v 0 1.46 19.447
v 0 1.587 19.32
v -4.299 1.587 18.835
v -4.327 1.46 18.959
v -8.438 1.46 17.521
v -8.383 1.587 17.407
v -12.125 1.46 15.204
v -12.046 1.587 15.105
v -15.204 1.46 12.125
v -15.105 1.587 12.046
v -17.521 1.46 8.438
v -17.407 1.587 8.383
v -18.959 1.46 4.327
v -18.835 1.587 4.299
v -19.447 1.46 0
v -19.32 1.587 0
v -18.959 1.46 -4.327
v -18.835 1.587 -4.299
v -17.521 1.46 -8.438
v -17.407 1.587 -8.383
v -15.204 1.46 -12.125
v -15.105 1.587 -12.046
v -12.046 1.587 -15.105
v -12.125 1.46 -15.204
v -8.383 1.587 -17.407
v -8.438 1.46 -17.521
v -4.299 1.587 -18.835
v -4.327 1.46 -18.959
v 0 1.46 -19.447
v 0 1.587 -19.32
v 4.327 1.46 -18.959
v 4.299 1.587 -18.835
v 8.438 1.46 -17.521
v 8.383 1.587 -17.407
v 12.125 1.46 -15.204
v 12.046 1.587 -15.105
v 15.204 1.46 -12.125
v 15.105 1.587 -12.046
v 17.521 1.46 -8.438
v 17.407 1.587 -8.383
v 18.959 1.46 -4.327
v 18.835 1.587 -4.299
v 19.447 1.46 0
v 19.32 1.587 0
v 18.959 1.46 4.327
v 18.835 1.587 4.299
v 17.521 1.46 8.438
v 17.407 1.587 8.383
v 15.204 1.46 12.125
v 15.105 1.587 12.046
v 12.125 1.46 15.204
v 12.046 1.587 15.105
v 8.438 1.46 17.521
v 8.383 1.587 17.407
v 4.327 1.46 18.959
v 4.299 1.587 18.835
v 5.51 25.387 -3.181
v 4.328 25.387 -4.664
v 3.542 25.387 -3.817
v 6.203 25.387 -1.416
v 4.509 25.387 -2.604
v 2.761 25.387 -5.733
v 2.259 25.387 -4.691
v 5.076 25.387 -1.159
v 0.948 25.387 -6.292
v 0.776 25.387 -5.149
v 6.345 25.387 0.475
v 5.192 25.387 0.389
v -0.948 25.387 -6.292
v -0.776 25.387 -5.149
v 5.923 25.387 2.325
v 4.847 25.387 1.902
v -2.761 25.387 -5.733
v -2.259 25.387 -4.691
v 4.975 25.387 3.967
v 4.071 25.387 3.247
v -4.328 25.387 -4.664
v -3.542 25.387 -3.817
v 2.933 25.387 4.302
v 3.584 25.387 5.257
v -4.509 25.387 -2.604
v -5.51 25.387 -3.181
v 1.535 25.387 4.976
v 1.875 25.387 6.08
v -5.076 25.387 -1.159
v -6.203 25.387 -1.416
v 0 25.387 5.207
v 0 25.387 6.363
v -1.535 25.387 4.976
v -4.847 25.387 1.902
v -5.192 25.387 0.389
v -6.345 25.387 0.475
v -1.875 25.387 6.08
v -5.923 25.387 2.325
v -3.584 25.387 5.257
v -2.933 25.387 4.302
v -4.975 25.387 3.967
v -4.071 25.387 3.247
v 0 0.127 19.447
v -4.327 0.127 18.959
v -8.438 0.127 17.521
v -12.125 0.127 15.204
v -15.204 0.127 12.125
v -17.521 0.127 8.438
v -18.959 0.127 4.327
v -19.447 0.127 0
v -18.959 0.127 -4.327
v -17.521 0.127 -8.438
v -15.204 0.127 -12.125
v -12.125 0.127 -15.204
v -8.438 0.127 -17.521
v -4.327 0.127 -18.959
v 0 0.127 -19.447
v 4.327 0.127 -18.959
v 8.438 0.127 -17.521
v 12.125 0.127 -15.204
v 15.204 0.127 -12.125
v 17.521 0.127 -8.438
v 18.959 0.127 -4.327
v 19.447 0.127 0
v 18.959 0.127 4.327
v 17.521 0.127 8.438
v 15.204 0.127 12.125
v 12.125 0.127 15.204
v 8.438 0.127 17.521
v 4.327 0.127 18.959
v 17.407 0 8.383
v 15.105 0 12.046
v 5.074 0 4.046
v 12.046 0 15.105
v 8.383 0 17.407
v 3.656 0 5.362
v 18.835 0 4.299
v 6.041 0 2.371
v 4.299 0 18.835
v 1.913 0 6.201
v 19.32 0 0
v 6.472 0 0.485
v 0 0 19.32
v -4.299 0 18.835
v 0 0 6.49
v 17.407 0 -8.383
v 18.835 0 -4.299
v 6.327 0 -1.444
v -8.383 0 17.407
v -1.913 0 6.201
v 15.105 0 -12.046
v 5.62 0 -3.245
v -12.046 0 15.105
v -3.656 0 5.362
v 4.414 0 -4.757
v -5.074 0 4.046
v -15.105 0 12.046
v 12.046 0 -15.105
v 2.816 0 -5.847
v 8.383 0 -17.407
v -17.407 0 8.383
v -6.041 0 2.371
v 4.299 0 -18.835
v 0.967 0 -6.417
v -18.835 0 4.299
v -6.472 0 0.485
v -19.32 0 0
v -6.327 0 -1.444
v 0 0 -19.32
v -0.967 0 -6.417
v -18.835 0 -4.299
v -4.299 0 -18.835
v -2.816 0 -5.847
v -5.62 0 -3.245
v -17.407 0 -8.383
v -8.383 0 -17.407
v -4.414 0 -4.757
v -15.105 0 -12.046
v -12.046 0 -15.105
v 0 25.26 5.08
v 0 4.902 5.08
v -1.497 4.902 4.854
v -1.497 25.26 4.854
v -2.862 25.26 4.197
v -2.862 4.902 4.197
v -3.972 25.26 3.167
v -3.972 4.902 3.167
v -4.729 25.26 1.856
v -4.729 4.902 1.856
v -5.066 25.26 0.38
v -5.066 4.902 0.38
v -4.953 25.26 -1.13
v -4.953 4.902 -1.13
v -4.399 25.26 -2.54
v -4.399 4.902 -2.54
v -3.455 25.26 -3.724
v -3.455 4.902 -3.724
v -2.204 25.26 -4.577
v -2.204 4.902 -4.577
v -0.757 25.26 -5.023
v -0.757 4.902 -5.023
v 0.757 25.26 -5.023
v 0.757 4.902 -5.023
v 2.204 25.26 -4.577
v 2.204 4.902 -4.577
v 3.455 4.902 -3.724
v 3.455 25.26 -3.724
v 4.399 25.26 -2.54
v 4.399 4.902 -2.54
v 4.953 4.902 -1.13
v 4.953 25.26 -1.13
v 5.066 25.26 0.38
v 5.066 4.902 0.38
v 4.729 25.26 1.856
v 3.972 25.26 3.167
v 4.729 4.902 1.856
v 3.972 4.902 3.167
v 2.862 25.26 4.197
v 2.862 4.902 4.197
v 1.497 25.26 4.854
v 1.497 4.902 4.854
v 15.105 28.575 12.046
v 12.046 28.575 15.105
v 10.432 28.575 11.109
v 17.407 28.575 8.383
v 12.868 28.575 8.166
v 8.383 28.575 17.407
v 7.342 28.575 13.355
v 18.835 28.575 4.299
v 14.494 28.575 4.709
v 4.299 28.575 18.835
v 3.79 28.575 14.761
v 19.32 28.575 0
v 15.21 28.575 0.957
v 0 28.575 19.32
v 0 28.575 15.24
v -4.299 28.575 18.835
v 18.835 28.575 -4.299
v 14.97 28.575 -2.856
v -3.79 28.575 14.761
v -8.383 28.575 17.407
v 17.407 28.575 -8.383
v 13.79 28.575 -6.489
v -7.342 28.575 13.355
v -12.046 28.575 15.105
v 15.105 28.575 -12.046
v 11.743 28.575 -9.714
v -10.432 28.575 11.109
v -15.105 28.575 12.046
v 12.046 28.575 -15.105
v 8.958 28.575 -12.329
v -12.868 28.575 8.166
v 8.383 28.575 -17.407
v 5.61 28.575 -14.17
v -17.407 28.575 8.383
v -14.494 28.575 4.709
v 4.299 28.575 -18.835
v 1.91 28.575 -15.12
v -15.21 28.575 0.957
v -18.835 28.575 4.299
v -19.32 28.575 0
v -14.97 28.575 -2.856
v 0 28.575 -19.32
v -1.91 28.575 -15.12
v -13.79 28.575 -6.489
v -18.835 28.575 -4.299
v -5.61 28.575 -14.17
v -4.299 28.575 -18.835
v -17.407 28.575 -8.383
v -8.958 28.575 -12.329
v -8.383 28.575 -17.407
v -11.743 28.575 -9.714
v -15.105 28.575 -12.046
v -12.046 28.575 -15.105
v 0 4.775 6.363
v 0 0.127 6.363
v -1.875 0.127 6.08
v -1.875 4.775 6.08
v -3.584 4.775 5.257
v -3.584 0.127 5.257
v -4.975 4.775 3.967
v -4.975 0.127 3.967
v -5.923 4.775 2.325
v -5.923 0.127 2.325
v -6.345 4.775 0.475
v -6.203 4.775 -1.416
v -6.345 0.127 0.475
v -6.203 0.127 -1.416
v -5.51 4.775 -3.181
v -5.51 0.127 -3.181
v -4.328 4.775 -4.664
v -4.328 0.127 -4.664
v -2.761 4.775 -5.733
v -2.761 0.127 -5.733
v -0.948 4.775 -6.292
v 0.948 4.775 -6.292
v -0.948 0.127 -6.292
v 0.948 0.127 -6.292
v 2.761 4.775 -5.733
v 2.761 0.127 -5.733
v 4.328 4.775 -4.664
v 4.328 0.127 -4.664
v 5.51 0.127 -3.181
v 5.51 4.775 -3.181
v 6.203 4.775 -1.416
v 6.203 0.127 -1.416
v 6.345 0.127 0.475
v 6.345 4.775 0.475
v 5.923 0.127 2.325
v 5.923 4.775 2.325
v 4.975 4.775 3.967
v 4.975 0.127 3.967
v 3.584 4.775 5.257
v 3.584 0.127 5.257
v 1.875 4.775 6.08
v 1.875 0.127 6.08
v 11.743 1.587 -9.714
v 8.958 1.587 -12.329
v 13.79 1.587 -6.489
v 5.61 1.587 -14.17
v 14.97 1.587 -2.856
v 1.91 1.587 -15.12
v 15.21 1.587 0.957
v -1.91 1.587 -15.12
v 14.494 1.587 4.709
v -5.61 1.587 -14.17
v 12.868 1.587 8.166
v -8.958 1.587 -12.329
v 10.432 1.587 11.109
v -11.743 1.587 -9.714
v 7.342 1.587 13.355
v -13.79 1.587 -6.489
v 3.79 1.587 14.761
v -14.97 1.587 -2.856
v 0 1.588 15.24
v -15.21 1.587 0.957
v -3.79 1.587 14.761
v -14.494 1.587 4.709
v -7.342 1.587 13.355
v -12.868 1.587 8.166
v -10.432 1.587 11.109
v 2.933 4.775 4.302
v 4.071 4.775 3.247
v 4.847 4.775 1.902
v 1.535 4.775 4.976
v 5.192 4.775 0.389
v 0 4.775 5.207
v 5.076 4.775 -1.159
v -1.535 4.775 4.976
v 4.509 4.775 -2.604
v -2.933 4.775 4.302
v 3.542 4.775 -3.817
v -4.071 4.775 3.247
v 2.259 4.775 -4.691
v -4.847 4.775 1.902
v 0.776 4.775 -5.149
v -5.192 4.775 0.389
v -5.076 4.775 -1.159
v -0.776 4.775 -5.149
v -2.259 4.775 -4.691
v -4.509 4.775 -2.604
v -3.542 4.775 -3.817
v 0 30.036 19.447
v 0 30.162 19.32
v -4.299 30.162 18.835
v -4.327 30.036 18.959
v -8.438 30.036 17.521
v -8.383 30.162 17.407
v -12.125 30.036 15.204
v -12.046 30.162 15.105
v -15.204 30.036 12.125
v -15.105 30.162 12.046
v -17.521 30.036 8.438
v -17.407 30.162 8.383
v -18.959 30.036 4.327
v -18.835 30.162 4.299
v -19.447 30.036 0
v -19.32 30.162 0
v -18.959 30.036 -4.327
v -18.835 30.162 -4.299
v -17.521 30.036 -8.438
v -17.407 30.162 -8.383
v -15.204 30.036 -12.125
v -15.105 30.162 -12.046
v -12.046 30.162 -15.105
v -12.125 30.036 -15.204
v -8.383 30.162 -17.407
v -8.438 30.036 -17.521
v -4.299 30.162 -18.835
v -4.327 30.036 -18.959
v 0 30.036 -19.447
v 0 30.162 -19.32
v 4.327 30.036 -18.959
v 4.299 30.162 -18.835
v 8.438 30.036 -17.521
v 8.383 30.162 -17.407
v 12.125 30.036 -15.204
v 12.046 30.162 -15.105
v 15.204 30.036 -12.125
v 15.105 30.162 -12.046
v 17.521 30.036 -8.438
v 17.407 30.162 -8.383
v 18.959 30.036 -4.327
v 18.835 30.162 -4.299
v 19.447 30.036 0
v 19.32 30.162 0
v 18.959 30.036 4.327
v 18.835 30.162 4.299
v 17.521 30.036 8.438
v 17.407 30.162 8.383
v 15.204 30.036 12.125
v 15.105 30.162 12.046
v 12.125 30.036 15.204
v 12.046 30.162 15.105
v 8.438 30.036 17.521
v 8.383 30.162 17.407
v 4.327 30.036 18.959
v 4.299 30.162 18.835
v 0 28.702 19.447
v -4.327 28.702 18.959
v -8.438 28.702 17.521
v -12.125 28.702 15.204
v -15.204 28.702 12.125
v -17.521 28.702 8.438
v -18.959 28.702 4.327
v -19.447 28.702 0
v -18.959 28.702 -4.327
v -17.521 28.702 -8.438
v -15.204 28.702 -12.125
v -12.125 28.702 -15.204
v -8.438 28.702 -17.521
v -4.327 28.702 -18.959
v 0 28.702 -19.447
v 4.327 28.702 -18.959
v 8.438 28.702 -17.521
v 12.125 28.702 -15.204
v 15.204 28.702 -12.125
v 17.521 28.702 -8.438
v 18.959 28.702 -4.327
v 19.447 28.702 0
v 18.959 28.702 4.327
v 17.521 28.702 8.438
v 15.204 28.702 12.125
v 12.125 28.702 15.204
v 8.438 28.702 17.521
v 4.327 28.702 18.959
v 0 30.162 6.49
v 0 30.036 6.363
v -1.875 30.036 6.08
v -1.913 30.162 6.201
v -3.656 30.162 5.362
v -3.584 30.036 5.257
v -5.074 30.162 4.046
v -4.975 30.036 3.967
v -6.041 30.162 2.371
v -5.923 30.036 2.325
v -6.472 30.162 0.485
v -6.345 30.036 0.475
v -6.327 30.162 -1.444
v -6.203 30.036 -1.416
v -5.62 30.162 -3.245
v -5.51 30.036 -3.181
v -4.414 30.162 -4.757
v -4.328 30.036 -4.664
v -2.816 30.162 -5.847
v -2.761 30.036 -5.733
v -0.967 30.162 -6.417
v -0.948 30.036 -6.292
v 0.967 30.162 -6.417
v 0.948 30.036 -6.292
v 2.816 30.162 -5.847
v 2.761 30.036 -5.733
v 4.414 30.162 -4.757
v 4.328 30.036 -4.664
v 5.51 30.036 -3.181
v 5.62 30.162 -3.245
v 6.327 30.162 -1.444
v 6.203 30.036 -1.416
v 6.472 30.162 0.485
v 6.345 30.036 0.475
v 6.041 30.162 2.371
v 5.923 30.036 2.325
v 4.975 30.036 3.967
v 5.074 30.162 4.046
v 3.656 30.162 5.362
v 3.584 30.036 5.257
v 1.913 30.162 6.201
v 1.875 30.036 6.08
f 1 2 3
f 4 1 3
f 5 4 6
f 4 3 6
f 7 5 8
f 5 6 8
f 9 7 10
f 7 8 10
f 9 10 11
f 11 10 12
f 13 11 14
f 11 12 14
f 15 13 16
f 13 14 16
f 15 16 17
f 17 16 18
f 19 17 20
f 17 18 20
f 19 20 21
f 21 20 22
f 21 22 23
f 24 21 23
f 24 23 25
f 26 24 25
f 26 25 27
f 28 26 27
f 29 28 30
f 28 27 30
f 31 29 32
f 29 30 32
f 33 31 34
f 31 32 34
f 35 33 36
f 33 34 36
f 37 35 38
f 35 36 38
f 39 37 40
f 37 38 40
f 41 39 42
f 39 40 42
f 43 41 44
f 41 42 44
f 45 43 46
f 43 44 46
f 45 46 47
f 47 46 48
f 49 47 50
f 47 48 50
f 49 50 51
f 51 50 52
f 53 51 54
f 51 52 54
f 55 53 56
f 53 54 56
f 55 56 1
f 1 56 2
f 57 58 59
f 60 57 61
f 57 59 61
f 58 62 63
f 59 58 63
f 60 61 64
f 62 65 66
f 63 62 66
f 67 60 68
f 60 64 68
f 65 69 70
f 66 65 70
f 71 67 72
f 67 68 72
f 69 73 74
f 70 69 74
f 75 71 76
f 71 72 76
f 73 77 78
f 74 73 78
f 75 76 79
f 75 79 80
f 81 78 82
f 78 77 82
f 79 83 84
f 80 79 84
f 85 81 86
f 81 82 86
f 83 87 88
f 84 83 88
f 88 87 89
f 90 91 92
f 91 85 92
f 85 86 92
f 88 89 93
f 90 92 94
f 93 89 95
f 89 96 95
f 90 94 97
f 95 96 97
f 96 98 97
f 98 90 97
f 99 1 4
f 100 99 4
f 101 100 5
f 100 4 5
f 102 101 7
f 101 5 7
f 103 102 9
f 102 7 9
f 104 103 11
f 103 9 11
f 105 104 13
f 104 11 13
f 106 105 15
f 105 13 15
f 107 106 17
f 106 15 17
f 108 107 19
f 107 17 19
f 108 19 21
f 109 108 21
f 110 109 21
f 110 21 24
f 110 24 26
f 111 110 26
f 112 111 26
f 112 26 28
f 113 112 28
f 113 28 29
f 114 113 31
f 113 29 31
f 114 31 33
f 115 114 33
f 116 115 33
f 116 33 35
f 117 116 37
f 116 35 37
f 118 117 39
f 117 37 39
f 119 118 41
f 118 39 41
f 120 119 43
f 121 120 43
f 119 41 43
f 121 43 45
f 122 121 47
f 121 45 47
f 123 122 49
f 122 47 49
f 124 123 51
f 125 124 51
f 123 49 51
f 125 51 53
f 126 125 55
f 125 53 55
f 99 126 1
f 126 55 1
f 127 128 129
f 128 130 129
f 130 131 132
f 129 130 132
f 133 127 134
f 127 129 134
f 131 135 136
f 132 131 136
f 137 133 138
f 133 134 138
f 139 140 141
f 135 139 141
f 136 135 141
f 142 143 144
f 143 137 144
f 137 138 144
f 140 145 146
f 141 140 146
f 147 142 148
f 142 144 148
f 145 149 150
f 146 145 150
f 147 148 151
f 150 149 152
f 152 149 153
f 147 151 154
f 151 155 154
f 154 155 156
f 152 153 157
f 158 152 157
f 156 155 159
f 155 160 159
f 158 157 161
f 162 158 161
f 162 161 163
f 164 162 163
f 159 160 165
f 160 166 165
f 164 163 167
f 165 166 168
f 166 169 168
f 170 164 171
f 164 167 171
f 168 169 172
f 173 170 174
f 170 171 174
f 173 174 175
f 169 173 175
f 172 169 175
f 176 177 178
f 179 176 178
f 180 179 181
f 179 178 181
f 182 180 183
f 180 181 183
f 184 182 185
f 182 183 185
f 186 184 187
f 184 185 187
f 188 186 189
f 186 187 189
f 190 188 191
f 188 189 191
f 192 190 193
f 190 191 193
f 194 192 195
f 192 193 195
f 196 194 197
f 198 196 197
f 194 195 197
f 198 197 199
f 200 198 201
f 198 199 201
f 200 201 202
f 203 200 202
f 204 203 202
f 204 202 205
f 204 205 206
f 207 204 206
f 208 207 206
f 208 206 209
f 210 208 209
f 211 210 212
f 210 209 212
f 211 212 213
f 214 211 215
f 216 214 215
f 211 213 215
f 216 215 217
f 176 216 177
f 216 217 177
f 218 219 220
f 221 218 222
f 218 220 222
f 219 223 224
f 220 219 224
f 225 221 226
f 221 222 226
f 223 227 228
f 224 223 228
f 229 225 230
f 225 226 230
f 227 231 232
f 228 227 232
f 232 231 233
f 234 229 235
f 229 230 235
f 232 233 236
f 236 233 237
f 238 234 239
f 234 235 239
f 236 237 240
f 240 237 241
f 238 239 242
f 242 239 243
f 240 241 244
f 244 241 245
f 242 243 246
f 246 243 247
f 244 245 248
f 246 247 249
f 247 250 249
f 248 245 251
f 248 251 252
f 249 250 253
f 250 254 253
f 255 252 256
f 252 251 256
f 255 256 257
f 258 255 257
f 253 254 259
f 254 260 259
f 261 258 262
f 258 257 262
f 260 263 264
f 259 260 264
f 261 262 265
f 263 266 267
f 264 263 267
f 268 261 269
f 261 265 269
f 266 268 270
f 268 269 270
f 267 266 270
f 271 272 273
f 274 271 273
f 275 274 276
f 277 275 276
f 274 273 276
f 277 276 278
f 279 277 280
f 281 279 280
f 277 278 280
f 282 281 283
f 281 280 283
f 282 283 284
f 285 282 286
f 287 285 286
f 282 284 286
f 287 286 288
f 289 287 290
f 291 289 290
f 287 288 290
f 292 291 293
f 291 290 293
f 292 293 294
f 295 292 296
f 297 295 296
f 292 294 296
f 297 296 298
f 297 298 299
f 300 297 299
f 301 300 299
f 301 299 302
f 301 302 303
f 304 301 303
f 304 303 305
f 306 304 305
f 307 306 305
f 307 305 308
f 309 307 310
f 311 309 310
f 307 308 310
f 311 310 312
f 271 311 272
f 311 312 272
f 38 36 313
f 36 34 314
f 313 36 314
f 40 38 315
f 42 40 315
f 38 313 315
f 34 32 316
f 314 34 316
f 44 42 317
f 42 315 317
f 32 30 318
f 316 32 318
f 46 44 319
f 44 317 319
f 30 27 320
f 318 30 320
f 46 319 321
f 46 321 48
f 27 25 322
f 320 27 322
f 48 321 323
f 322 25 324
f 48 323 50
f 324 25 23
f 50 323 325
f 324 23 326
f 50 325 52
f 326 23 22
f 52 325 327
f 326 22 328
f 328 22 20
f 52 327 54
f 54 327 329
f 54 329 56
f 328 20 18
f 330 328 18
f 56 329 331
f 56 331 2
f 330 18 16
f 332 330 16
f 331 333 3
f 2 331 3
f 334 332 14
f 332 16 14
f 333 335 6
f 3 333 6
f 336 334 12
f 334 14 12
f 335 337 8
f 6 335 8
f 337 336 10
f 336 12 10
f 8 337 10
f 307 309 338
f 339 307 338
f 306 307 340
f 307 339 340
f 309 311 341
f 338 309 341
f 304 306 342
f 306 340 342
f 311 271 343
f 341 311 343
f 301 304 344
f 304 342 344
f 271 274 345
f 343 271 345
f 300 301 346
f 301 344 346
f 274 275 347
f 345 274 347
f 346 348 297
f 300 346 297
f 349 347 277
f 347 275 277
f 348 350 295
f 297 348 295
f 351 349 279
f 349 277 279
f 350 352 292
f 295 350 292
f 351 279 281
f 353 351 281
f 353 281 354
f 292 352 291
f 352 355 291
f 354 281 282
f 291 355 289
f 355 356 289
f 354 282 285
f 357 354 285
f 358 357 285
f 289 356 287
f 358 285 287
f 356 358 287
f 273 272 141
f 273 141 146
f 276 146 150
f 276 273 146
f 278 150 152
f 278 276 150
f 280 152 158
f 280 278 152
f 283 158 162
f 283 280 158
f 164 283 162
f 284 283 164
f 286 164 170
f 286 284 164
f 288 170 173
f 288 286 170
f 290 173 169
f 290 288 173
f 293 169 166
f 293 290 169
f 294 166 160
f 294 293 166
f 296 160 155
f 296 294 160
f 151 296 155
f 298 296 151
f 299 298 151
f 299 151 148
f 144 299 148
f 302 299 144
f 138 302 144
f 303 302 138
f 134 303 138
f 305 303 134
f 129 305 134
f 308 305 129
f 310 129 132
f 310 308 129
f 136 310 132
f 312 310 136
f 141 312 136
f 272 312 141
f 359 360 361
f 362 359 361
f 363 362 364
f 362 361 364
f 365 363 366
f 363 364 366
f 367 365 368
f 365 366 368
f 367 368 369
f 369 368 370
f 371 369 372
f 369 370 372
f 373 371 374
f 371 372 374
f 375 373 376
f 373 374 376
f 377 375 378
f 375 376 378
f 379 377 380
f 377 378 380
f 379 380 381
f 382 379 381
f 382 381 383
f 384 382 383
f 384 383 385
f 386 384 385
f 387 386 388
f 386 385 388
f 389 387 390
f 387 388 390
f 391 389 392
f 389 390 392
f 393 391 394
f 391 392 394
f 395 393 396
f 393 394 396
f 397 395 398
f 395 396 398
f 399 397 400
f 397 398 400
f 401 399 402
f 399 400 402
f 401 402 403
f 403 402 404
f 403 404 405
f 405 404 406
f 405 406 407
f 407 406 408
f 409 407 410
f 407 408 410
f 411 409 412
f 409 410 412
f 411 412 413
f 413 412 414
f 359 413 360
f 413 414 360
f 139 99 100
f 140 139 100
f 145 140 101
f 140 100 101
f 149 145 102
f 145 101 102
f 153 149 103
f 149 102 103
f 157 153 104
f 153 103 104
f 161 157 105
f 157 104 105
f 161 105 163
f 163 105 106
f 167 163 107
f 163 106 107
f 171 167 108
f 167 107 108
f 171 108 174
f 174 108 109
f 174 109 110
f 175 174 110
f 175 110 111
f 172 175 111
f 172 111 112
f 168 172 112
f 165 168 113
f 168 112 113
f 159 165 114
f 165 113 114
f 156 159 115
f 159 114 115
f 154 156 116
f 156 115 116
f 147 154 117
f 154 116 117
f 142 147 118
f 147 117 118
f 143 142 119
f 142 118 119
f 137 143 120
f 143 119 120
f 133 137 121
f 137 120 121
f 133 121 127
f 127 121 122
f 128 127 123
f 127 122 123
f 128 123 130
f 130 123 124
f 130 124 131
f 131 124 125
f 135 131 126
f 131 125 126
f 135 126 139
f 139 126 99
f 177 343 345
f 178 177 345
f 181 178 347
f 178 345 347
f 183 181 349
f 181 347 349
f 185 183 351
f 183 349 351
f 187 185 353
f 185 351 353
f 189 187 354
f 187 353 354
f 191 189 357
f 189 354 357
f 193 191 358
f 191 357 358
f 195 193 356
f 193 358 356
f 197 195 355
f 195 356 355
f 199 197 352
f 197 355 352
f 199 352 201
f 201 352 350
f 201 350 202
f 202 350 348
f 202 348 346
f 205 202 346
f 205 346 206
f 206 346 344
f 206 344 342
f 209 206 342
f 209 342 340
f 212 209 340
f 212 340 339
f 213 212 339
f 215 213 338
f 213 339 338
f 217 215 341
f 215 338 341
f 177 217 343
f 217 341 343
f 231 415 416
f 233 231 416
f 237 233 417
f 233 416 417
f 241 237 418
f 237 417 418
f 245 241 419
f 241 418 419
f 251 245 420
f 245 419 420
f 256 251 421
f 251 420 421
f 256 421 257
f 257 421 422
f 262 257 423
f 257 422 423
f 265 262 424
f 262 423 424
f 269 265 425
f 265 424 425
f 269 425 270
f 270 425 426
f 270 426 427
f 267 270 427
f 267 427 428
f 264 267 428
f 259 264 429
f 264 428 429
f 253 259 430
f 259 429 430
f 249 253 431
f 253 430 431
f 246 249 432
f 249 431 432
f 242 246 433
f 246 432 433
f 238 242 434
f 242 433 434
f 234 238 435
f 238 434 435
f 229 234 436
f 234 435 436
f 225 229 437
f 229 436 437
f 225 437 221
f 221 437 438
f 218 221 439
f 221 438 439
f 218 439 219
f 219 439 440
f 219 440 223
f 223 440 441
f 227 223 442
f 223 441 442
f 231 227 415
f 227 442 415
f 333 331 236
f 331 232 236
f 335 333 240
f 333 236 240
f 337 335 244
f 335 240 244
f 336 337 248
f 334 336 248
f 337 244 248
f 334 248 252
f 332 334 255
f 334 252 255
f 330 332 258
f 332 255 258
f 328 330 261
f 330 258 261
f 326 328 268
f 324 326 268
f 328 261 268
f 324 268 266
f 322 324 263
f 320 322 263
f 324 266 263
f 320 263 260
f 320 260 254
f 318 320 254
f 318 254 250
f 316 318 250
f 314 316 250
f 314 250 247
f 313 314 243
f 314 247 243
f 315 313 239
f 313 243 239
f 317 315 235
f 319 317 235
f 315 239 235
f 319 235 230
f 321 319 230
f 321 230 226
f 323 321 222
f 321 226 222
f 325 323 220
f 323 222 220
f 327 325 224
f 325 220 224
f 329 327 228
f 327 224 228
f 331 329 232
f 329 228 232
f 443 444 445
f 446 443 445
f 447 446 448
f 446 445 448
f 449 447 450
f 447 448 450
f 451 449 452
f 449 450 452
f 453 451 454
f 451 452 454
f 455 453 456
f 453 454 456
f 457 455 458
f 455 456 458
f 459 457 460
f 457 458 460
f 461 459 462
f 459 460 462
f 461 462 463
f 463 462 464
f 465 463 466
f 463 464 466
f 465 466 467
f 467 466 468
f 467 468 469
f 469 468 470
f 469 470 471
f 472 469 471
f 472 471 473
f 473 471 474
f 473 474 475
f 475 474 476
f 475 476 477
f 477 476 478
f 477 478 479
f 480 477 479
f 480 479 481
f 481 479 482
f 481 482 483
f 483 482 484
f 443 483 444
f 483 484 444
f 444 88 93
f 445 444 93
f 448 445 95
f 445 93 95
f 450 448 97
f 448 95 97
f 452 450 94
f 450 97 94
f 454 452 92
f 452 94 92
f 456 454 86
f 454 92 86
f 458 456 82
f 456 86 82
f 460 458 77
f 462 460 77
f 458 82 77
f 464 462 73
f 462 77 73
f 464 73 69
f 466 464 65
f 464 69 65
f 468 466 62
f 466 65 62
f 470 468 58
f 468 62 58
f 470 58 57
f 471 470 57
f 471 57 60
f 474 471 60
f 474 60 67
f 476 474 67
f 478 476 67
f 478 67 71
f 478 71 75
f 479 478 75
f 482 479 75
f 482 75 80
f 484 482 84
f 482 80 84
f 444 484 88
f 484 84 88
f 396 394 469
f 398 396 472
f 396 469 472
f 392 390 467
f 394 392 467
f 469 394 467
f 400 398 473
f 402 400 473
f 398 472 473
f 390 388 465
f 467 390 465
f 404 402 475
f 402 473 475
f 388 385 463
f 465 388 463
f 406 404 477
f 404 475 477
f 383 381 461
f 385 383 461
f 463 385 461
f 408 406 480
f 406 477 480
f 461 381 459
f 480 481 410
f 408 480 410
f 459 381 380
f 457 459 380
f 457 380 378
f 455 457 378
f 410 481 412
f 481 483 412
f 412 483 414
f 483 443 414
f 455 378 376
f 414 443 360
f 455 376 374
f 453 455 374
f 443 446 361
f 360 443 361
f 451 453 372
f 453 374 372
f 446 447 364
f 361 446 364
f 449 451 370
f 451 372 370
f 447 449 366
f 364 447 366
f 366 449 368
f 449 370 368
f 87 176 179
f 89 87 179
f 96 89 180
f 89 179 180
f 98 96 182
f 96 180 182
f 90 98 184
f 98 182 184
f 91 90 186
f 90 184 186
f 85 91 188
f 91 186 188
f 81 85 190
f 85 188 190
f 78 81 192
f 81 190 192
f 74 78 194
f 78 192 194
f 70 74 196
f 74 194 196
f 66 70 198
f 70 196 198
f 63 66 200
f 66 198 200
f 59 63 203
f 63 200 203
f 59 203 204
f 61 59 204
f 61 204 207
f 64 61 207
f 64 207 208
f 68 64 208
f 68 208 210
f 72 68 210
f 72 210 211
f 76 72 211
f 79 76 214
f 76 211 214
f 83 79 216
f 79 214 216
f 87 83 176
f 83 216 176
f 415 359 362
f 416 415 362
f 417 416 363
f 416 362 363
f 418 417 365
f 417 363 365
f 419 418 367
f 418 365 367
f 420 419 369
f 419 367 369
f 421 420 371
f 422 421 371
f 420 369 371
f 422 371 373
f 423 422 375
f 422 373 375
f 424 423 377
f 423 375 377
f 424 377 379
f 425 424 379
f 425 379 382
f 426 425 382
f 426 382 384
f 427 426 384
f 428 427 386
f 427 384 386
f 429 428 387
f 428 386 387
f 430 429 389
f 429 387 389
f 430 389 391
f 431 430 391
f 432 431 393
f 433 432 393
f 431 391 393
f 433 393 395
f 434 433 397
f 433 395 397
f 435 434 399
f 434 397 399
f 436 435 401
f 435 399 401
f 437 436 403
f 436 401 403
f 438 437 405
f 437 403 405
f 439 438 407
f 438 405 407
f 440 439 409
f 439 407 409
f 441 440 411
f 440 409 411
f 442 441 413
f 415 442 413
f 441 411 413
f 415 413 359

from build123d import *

# Parameters (mm, degrees)
CHAMFER1_SIZE = 0.127


with BuildPart() as part:
    # Sketch1 → Revolve1 (revolve)
    with BuildSketch(Plane.XY, mode=Mode.PRIVATE) as revolve1_sk:
        Polygon((6.3627, 0), (19.446875, 0), (19.446875, 1.5875), (15.24, 1.5875), (15.24, 28.575), (19.446875, 28.575), (19.446875, 30.1625), (6.3627, 30.1625), (6.3627, 25.3873), (5.08, 25.3873), (5.08, 4.7752), (6.3627, 4.7752), align=None)
    revolve(revolve1_sk.sketch.rotate(Axis((0, 30.1625, 0), (0, -1, 0)), 90), axis=Axis((0, 30.1625, 0), (0, -1, 0)))

    # Chamfer1
    chamfer1_edges = [part.edges().sort_by_distance(p)[0] for p in [
        (0, 4.7752, -5.08),
        (0, 25.3873, -5.08),
        (0, 30.1625, -6.3627),
        (0, 30.1625, -19.446875),
        (0, 28.575, -19.446875),
        (0, 1.5875, -19.446875),
        (0, 0, -19.446875),
        (0, 0, -6.3627),
    ]]
    chamfer(chamfer1_edges, length=CHAMFER1_SIZE)


solid = part.part
